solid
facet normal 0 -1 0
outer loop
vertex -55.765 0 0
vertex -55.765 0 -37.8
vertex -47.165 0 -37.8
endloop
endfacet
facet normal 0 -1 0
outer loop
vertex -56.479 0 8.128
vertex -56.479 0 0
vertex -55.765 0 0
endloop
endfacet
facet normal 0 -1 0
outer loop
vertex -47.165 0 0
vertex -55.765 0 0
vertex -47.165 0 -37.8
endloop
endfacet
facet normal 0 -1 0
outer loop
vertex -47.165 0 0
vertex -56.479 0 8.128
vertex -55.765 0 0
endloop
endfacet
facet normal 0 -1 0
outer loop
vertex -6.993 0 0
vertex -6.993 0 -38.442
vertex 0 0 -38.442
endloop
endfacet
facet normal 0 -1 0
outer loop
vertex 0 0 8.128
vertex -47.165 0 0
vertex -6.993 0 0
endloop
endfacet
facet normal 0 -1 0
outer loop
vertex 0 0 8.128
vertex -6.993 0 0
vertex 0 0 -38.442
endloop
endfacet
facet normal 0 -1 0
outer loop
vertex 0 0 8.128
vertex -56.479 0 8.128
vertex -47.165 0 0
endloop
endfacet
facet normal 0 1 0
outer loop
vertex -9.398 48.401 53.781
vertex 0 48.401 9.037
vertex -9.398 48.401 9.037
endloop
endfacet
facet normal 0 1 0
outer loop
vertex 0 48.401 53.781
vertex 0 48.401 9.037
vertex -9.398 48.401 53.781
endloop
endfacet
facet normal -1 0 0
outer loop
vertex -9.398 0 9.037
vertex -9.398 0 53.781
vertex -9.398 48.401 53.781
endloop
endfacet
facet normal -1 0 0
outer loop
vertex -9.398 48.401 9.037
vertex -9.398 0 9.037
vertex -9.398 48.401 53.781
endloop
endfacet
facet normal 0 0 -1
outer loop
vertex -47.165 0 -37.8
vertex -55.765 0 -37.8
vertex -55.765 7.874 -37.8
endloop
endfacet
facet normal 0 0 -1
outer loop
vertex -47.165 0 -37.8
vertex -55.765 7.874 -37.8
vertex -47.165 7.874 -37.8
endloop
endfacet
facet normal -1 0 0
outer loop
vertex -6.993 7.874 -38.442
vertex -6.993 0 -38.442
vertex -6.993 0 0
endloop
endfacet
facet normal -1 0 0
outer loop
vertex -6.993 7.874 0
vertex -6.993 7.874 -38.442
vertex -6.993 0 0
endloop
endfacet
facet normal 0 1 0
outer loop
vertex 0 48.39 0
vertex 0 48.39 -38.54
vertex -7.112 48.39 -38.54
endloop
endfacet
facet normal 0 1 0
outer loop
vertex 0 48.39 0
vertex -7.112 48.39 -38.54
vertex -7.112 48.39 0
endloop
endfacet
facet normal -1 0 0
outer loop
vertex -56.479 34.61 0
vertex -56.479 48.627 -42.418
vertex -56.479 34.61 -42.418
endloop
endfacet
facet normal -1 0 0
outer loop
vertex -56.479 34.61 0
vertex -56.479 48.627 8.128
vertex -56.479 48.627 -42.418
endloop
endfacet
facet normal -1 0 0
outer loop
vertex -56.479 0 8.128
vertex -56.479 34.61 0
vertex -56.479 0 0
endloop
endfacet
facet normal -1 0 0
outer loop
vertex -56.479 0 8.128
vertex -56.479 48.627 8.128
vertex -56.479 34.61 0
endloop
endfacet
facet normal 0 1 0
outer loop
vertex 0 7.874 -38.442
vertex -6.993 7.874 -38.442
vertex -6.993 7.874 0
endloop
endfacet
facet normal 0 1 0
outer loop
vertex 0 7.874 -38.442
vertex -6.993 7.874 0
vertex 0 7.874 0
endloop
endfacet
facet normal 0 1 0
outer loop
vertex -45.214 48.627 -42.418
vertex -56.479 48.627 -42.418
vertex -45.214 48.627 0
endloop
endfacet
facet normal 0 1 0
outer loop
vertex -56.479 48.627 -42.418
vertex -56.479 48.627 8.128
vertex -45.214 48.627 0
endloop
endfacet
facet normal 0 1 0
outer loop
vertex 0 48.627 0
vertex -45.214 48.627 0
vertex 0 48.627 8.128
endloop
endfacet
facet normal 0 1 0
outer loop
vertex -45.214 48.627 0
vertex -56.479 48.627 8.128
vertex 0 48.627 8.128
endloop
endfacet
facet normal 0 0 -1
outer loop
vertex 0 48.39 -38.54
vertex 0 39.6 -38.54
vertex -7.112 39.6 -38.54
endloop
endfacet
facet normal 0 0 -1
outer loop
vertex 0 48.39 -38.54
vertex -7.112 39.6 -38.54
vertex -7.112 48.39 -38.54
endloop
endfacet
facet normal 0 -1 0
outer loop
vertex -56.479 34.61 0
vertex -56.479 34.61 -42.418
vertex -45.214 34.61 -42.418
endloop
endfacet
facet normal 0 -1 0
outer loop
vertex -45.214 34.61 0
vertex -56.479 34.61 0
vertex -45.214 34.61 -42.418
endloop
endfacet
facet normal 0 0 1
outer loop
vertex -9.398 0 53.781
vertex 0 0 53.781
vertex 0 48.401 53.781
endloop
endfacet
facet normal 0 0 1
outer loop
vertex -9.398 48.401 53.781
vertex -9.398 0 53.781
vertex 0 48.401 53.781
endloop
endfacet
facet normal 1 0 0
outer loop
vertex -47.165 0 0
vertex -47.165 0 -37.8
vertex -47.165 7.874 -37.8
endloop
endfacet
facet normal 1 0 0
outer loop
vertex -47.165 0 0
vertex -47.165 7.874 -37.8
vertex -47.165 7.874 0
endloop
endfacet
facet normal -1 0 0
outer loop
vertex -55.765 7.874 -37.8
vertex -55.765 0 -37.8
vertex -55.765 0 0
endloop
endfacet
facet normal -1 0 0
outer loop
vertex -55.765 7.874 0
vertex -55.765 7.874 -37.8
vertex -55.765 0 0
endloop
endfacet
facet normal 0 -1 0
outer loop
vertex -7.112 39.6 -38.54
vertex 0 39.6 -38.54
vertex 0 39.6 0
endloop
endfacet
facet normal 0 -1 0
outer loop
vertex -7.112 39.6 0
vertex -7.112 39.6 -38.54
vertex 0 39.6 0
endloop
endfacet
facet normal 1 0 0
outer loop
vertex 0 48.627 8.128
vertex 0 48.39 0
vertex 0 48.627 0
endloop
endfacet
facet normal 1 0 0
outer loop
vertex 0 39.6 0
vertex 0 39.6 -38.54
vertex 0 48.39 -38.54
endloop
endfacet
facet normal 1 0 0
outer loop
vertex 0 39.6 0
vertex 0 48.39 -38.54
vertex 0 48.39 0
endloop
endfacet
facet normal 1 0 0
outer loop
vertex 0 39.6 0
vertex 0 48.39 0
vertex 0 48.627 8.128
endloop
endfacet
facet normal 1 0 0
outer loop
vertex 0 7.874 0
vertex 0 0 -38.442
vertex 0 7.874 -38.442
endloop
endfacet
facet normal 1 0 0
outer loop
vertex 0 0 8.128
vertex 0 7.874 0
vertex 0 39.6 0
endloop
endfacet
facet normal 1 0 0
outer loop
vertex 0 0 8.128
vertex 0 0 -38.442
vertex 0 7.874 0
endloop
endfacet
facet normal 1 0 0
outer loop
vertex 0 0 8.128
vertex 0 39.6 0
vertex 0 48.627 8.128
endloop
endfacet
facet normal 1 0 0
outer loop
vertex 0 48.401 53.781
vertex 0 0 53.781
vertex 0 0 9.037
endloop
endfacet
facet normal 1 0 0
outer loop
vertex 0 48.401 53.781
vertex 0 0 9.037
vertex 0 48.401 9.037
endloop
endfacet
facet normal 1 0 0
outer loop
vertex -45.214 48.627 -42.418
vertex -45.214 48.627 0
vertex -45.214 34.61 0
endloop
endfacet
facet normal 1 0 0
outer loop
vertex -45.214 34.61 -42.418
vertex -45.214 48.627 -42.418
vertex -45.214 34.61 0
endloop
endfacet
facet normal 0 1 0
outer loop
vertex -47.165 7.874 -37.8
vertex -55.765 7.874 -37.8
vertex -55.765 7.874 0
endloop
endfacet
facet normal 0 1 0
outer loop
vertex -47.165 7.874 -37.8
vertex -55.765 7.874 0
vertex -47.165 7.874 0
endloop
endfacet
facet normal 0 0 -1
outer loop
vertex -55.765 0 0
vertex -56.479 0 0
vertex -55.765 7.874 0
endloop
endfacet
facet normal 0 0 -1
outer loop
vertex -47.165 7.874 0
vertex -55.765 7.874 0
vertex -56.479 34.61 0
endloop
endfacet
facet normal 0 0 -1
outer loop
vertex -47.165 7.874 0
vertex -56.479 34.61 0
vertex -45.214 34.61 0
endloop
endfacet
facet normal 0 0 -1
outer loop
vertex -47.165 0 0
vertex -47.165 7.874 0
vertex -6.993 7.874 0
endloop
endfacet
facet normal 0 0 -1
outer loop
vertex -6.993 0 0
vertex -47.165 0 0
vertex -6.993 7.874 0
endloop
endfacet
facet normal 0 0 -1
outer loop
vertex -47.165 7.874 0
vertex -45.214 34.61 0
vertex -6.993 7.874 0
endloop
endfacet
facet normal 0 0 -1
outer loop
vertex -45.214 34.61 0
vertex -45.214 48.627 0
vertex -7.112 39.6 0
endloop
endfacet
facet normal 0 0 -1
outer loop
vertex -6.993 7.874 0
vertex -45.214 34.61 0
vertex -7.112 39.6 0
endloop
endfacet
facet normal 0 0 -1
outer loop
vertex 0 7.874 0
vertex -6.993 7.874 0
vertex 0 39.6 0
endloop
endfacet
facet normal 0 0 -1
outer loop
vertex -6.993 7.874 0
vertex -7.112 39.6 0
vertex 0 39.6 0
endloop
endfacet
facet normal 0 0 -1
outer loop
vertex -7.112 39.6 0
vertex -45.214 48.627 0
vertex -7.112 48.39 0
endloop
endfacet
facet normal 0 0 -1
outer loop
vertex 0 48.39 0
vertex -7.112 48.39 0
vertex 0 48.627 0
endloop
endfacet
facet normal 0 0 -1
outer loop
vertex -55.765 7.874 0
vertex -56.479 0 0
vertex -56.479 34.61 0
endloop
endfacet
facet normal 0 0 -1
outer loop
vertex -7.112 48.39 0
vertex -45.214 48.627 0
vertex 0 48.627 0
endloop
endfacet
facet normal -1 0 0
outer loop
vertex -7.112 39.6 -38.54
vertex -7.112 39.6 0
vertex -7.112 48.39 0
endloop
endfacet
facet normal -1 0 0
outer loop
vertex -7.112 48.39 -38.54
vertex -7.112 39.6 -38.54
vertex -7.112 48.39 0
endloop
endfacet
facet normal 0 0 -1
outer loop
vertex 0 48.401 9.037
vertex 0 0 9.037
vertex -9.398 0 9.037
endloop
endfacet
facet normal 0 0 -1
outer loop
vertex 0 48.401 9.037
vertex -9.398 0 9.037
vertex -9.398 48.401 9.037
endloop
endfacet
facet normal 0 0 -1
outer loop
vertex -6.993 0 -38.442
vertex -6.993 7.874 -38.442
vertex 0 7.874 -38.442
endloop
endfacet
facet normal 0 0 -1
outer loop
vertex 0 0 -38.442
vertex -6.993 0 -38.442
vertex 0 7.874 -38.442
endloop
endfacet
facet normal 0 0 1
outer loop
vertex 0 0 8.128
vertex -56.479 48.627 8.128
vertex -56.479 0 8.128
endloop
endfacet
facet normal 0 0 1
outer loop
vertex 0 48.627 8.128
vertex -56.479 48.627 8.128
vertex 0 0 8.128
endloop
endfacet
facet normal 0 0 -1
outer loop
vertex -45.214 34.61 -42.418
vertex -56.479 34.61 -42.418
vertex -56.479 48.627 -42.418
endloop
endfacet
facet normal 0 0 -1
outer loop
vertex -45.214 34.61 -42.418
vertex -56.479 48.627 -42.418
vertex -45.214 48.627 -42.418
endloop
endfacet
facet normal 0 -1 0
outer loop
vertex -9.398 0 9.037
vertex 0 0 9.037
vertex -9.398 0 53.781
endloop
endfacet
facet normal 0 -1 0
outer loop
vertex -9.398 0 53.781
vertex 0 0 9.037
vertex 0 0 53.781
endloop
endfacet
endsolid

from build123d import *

# Parameters (mm, degrees)
F0_W      = 56.4791858196
F0_H      = 48.6274659634
F1_DEPTH  = 8.128
F2_W      = 8.5997208953
F2_H      = 37.7997383475
F2_W_2    = 6.992766168
F2_H_2    = 38.4415946901
F3_DEPTH  = 7.874
F4_W      = 8.7898299098
F4_H      = 38.5400280356
F5_DEPTH  = 7.112
F6_W      = 11.2653039396
F6_H      = 14.0175670385
F7_DEPTH  = 42.418
F8_W      = 48.401452601
F8_H      = 44.7438852862
F10_DEPTH = 9.398


# Not quite as in the source:
# - a feature of the source that left no trace in its solid (it failed there, or was rolled back) is left out


with BuildPart() as f1:
    # F0 (on Top) → F1 (new body)
    with BuildSketch(Plane.XY):
        with Locations((-28.2395929098, 24.3137329817)):
            Rectangle(F0_W, F0_H)
    extrude(amount=F1_DEPTH)

    # F2 (on Front) → F3 (join)
    with BuildSketch(Plane.XZ):
        with Locations((-51.4646843076, -18.8998691738)):
            Rectangle(F2_W, F2_H)
        with Locations((-3.496383084, -19.220797345)):
            Rectangle(F2_W_2, F2_H_2)
    extrude(amount=-F3_DEPTH)

    # F4 (on Right) → F5 (join)
    with BuildSketch(Plane.YZ):
        with Locations((43.9947880805, -19.2700140178)):
            Rectangle(F4_W, F4_H)
    extrude(amount=-F5_DEPTH)

    # F6 (on face) → F7 (join)
    with BuildSketch(Plane(origin=(0, 0, 0), x_dir=(1, 0, 0), z_dir=(0, 0, -1))):
        with Locations((-50.8465338498, -41.6186824441)):
            Rectangle(F6_W, F6_H)
    extrude(amount=F7_DEPTH)


with BuildPart() as f10:
    # F8 (on Right) → F10 (new body)
    with BuildSketch(Plane.YZ):
        with Locations((24.2007263005, 31.4088850282)):
            Rectangle(F8_W, F8_H)
    extrude(amount=-F10_DEPTH)


solid = Compound([f1.part, f10.part])
